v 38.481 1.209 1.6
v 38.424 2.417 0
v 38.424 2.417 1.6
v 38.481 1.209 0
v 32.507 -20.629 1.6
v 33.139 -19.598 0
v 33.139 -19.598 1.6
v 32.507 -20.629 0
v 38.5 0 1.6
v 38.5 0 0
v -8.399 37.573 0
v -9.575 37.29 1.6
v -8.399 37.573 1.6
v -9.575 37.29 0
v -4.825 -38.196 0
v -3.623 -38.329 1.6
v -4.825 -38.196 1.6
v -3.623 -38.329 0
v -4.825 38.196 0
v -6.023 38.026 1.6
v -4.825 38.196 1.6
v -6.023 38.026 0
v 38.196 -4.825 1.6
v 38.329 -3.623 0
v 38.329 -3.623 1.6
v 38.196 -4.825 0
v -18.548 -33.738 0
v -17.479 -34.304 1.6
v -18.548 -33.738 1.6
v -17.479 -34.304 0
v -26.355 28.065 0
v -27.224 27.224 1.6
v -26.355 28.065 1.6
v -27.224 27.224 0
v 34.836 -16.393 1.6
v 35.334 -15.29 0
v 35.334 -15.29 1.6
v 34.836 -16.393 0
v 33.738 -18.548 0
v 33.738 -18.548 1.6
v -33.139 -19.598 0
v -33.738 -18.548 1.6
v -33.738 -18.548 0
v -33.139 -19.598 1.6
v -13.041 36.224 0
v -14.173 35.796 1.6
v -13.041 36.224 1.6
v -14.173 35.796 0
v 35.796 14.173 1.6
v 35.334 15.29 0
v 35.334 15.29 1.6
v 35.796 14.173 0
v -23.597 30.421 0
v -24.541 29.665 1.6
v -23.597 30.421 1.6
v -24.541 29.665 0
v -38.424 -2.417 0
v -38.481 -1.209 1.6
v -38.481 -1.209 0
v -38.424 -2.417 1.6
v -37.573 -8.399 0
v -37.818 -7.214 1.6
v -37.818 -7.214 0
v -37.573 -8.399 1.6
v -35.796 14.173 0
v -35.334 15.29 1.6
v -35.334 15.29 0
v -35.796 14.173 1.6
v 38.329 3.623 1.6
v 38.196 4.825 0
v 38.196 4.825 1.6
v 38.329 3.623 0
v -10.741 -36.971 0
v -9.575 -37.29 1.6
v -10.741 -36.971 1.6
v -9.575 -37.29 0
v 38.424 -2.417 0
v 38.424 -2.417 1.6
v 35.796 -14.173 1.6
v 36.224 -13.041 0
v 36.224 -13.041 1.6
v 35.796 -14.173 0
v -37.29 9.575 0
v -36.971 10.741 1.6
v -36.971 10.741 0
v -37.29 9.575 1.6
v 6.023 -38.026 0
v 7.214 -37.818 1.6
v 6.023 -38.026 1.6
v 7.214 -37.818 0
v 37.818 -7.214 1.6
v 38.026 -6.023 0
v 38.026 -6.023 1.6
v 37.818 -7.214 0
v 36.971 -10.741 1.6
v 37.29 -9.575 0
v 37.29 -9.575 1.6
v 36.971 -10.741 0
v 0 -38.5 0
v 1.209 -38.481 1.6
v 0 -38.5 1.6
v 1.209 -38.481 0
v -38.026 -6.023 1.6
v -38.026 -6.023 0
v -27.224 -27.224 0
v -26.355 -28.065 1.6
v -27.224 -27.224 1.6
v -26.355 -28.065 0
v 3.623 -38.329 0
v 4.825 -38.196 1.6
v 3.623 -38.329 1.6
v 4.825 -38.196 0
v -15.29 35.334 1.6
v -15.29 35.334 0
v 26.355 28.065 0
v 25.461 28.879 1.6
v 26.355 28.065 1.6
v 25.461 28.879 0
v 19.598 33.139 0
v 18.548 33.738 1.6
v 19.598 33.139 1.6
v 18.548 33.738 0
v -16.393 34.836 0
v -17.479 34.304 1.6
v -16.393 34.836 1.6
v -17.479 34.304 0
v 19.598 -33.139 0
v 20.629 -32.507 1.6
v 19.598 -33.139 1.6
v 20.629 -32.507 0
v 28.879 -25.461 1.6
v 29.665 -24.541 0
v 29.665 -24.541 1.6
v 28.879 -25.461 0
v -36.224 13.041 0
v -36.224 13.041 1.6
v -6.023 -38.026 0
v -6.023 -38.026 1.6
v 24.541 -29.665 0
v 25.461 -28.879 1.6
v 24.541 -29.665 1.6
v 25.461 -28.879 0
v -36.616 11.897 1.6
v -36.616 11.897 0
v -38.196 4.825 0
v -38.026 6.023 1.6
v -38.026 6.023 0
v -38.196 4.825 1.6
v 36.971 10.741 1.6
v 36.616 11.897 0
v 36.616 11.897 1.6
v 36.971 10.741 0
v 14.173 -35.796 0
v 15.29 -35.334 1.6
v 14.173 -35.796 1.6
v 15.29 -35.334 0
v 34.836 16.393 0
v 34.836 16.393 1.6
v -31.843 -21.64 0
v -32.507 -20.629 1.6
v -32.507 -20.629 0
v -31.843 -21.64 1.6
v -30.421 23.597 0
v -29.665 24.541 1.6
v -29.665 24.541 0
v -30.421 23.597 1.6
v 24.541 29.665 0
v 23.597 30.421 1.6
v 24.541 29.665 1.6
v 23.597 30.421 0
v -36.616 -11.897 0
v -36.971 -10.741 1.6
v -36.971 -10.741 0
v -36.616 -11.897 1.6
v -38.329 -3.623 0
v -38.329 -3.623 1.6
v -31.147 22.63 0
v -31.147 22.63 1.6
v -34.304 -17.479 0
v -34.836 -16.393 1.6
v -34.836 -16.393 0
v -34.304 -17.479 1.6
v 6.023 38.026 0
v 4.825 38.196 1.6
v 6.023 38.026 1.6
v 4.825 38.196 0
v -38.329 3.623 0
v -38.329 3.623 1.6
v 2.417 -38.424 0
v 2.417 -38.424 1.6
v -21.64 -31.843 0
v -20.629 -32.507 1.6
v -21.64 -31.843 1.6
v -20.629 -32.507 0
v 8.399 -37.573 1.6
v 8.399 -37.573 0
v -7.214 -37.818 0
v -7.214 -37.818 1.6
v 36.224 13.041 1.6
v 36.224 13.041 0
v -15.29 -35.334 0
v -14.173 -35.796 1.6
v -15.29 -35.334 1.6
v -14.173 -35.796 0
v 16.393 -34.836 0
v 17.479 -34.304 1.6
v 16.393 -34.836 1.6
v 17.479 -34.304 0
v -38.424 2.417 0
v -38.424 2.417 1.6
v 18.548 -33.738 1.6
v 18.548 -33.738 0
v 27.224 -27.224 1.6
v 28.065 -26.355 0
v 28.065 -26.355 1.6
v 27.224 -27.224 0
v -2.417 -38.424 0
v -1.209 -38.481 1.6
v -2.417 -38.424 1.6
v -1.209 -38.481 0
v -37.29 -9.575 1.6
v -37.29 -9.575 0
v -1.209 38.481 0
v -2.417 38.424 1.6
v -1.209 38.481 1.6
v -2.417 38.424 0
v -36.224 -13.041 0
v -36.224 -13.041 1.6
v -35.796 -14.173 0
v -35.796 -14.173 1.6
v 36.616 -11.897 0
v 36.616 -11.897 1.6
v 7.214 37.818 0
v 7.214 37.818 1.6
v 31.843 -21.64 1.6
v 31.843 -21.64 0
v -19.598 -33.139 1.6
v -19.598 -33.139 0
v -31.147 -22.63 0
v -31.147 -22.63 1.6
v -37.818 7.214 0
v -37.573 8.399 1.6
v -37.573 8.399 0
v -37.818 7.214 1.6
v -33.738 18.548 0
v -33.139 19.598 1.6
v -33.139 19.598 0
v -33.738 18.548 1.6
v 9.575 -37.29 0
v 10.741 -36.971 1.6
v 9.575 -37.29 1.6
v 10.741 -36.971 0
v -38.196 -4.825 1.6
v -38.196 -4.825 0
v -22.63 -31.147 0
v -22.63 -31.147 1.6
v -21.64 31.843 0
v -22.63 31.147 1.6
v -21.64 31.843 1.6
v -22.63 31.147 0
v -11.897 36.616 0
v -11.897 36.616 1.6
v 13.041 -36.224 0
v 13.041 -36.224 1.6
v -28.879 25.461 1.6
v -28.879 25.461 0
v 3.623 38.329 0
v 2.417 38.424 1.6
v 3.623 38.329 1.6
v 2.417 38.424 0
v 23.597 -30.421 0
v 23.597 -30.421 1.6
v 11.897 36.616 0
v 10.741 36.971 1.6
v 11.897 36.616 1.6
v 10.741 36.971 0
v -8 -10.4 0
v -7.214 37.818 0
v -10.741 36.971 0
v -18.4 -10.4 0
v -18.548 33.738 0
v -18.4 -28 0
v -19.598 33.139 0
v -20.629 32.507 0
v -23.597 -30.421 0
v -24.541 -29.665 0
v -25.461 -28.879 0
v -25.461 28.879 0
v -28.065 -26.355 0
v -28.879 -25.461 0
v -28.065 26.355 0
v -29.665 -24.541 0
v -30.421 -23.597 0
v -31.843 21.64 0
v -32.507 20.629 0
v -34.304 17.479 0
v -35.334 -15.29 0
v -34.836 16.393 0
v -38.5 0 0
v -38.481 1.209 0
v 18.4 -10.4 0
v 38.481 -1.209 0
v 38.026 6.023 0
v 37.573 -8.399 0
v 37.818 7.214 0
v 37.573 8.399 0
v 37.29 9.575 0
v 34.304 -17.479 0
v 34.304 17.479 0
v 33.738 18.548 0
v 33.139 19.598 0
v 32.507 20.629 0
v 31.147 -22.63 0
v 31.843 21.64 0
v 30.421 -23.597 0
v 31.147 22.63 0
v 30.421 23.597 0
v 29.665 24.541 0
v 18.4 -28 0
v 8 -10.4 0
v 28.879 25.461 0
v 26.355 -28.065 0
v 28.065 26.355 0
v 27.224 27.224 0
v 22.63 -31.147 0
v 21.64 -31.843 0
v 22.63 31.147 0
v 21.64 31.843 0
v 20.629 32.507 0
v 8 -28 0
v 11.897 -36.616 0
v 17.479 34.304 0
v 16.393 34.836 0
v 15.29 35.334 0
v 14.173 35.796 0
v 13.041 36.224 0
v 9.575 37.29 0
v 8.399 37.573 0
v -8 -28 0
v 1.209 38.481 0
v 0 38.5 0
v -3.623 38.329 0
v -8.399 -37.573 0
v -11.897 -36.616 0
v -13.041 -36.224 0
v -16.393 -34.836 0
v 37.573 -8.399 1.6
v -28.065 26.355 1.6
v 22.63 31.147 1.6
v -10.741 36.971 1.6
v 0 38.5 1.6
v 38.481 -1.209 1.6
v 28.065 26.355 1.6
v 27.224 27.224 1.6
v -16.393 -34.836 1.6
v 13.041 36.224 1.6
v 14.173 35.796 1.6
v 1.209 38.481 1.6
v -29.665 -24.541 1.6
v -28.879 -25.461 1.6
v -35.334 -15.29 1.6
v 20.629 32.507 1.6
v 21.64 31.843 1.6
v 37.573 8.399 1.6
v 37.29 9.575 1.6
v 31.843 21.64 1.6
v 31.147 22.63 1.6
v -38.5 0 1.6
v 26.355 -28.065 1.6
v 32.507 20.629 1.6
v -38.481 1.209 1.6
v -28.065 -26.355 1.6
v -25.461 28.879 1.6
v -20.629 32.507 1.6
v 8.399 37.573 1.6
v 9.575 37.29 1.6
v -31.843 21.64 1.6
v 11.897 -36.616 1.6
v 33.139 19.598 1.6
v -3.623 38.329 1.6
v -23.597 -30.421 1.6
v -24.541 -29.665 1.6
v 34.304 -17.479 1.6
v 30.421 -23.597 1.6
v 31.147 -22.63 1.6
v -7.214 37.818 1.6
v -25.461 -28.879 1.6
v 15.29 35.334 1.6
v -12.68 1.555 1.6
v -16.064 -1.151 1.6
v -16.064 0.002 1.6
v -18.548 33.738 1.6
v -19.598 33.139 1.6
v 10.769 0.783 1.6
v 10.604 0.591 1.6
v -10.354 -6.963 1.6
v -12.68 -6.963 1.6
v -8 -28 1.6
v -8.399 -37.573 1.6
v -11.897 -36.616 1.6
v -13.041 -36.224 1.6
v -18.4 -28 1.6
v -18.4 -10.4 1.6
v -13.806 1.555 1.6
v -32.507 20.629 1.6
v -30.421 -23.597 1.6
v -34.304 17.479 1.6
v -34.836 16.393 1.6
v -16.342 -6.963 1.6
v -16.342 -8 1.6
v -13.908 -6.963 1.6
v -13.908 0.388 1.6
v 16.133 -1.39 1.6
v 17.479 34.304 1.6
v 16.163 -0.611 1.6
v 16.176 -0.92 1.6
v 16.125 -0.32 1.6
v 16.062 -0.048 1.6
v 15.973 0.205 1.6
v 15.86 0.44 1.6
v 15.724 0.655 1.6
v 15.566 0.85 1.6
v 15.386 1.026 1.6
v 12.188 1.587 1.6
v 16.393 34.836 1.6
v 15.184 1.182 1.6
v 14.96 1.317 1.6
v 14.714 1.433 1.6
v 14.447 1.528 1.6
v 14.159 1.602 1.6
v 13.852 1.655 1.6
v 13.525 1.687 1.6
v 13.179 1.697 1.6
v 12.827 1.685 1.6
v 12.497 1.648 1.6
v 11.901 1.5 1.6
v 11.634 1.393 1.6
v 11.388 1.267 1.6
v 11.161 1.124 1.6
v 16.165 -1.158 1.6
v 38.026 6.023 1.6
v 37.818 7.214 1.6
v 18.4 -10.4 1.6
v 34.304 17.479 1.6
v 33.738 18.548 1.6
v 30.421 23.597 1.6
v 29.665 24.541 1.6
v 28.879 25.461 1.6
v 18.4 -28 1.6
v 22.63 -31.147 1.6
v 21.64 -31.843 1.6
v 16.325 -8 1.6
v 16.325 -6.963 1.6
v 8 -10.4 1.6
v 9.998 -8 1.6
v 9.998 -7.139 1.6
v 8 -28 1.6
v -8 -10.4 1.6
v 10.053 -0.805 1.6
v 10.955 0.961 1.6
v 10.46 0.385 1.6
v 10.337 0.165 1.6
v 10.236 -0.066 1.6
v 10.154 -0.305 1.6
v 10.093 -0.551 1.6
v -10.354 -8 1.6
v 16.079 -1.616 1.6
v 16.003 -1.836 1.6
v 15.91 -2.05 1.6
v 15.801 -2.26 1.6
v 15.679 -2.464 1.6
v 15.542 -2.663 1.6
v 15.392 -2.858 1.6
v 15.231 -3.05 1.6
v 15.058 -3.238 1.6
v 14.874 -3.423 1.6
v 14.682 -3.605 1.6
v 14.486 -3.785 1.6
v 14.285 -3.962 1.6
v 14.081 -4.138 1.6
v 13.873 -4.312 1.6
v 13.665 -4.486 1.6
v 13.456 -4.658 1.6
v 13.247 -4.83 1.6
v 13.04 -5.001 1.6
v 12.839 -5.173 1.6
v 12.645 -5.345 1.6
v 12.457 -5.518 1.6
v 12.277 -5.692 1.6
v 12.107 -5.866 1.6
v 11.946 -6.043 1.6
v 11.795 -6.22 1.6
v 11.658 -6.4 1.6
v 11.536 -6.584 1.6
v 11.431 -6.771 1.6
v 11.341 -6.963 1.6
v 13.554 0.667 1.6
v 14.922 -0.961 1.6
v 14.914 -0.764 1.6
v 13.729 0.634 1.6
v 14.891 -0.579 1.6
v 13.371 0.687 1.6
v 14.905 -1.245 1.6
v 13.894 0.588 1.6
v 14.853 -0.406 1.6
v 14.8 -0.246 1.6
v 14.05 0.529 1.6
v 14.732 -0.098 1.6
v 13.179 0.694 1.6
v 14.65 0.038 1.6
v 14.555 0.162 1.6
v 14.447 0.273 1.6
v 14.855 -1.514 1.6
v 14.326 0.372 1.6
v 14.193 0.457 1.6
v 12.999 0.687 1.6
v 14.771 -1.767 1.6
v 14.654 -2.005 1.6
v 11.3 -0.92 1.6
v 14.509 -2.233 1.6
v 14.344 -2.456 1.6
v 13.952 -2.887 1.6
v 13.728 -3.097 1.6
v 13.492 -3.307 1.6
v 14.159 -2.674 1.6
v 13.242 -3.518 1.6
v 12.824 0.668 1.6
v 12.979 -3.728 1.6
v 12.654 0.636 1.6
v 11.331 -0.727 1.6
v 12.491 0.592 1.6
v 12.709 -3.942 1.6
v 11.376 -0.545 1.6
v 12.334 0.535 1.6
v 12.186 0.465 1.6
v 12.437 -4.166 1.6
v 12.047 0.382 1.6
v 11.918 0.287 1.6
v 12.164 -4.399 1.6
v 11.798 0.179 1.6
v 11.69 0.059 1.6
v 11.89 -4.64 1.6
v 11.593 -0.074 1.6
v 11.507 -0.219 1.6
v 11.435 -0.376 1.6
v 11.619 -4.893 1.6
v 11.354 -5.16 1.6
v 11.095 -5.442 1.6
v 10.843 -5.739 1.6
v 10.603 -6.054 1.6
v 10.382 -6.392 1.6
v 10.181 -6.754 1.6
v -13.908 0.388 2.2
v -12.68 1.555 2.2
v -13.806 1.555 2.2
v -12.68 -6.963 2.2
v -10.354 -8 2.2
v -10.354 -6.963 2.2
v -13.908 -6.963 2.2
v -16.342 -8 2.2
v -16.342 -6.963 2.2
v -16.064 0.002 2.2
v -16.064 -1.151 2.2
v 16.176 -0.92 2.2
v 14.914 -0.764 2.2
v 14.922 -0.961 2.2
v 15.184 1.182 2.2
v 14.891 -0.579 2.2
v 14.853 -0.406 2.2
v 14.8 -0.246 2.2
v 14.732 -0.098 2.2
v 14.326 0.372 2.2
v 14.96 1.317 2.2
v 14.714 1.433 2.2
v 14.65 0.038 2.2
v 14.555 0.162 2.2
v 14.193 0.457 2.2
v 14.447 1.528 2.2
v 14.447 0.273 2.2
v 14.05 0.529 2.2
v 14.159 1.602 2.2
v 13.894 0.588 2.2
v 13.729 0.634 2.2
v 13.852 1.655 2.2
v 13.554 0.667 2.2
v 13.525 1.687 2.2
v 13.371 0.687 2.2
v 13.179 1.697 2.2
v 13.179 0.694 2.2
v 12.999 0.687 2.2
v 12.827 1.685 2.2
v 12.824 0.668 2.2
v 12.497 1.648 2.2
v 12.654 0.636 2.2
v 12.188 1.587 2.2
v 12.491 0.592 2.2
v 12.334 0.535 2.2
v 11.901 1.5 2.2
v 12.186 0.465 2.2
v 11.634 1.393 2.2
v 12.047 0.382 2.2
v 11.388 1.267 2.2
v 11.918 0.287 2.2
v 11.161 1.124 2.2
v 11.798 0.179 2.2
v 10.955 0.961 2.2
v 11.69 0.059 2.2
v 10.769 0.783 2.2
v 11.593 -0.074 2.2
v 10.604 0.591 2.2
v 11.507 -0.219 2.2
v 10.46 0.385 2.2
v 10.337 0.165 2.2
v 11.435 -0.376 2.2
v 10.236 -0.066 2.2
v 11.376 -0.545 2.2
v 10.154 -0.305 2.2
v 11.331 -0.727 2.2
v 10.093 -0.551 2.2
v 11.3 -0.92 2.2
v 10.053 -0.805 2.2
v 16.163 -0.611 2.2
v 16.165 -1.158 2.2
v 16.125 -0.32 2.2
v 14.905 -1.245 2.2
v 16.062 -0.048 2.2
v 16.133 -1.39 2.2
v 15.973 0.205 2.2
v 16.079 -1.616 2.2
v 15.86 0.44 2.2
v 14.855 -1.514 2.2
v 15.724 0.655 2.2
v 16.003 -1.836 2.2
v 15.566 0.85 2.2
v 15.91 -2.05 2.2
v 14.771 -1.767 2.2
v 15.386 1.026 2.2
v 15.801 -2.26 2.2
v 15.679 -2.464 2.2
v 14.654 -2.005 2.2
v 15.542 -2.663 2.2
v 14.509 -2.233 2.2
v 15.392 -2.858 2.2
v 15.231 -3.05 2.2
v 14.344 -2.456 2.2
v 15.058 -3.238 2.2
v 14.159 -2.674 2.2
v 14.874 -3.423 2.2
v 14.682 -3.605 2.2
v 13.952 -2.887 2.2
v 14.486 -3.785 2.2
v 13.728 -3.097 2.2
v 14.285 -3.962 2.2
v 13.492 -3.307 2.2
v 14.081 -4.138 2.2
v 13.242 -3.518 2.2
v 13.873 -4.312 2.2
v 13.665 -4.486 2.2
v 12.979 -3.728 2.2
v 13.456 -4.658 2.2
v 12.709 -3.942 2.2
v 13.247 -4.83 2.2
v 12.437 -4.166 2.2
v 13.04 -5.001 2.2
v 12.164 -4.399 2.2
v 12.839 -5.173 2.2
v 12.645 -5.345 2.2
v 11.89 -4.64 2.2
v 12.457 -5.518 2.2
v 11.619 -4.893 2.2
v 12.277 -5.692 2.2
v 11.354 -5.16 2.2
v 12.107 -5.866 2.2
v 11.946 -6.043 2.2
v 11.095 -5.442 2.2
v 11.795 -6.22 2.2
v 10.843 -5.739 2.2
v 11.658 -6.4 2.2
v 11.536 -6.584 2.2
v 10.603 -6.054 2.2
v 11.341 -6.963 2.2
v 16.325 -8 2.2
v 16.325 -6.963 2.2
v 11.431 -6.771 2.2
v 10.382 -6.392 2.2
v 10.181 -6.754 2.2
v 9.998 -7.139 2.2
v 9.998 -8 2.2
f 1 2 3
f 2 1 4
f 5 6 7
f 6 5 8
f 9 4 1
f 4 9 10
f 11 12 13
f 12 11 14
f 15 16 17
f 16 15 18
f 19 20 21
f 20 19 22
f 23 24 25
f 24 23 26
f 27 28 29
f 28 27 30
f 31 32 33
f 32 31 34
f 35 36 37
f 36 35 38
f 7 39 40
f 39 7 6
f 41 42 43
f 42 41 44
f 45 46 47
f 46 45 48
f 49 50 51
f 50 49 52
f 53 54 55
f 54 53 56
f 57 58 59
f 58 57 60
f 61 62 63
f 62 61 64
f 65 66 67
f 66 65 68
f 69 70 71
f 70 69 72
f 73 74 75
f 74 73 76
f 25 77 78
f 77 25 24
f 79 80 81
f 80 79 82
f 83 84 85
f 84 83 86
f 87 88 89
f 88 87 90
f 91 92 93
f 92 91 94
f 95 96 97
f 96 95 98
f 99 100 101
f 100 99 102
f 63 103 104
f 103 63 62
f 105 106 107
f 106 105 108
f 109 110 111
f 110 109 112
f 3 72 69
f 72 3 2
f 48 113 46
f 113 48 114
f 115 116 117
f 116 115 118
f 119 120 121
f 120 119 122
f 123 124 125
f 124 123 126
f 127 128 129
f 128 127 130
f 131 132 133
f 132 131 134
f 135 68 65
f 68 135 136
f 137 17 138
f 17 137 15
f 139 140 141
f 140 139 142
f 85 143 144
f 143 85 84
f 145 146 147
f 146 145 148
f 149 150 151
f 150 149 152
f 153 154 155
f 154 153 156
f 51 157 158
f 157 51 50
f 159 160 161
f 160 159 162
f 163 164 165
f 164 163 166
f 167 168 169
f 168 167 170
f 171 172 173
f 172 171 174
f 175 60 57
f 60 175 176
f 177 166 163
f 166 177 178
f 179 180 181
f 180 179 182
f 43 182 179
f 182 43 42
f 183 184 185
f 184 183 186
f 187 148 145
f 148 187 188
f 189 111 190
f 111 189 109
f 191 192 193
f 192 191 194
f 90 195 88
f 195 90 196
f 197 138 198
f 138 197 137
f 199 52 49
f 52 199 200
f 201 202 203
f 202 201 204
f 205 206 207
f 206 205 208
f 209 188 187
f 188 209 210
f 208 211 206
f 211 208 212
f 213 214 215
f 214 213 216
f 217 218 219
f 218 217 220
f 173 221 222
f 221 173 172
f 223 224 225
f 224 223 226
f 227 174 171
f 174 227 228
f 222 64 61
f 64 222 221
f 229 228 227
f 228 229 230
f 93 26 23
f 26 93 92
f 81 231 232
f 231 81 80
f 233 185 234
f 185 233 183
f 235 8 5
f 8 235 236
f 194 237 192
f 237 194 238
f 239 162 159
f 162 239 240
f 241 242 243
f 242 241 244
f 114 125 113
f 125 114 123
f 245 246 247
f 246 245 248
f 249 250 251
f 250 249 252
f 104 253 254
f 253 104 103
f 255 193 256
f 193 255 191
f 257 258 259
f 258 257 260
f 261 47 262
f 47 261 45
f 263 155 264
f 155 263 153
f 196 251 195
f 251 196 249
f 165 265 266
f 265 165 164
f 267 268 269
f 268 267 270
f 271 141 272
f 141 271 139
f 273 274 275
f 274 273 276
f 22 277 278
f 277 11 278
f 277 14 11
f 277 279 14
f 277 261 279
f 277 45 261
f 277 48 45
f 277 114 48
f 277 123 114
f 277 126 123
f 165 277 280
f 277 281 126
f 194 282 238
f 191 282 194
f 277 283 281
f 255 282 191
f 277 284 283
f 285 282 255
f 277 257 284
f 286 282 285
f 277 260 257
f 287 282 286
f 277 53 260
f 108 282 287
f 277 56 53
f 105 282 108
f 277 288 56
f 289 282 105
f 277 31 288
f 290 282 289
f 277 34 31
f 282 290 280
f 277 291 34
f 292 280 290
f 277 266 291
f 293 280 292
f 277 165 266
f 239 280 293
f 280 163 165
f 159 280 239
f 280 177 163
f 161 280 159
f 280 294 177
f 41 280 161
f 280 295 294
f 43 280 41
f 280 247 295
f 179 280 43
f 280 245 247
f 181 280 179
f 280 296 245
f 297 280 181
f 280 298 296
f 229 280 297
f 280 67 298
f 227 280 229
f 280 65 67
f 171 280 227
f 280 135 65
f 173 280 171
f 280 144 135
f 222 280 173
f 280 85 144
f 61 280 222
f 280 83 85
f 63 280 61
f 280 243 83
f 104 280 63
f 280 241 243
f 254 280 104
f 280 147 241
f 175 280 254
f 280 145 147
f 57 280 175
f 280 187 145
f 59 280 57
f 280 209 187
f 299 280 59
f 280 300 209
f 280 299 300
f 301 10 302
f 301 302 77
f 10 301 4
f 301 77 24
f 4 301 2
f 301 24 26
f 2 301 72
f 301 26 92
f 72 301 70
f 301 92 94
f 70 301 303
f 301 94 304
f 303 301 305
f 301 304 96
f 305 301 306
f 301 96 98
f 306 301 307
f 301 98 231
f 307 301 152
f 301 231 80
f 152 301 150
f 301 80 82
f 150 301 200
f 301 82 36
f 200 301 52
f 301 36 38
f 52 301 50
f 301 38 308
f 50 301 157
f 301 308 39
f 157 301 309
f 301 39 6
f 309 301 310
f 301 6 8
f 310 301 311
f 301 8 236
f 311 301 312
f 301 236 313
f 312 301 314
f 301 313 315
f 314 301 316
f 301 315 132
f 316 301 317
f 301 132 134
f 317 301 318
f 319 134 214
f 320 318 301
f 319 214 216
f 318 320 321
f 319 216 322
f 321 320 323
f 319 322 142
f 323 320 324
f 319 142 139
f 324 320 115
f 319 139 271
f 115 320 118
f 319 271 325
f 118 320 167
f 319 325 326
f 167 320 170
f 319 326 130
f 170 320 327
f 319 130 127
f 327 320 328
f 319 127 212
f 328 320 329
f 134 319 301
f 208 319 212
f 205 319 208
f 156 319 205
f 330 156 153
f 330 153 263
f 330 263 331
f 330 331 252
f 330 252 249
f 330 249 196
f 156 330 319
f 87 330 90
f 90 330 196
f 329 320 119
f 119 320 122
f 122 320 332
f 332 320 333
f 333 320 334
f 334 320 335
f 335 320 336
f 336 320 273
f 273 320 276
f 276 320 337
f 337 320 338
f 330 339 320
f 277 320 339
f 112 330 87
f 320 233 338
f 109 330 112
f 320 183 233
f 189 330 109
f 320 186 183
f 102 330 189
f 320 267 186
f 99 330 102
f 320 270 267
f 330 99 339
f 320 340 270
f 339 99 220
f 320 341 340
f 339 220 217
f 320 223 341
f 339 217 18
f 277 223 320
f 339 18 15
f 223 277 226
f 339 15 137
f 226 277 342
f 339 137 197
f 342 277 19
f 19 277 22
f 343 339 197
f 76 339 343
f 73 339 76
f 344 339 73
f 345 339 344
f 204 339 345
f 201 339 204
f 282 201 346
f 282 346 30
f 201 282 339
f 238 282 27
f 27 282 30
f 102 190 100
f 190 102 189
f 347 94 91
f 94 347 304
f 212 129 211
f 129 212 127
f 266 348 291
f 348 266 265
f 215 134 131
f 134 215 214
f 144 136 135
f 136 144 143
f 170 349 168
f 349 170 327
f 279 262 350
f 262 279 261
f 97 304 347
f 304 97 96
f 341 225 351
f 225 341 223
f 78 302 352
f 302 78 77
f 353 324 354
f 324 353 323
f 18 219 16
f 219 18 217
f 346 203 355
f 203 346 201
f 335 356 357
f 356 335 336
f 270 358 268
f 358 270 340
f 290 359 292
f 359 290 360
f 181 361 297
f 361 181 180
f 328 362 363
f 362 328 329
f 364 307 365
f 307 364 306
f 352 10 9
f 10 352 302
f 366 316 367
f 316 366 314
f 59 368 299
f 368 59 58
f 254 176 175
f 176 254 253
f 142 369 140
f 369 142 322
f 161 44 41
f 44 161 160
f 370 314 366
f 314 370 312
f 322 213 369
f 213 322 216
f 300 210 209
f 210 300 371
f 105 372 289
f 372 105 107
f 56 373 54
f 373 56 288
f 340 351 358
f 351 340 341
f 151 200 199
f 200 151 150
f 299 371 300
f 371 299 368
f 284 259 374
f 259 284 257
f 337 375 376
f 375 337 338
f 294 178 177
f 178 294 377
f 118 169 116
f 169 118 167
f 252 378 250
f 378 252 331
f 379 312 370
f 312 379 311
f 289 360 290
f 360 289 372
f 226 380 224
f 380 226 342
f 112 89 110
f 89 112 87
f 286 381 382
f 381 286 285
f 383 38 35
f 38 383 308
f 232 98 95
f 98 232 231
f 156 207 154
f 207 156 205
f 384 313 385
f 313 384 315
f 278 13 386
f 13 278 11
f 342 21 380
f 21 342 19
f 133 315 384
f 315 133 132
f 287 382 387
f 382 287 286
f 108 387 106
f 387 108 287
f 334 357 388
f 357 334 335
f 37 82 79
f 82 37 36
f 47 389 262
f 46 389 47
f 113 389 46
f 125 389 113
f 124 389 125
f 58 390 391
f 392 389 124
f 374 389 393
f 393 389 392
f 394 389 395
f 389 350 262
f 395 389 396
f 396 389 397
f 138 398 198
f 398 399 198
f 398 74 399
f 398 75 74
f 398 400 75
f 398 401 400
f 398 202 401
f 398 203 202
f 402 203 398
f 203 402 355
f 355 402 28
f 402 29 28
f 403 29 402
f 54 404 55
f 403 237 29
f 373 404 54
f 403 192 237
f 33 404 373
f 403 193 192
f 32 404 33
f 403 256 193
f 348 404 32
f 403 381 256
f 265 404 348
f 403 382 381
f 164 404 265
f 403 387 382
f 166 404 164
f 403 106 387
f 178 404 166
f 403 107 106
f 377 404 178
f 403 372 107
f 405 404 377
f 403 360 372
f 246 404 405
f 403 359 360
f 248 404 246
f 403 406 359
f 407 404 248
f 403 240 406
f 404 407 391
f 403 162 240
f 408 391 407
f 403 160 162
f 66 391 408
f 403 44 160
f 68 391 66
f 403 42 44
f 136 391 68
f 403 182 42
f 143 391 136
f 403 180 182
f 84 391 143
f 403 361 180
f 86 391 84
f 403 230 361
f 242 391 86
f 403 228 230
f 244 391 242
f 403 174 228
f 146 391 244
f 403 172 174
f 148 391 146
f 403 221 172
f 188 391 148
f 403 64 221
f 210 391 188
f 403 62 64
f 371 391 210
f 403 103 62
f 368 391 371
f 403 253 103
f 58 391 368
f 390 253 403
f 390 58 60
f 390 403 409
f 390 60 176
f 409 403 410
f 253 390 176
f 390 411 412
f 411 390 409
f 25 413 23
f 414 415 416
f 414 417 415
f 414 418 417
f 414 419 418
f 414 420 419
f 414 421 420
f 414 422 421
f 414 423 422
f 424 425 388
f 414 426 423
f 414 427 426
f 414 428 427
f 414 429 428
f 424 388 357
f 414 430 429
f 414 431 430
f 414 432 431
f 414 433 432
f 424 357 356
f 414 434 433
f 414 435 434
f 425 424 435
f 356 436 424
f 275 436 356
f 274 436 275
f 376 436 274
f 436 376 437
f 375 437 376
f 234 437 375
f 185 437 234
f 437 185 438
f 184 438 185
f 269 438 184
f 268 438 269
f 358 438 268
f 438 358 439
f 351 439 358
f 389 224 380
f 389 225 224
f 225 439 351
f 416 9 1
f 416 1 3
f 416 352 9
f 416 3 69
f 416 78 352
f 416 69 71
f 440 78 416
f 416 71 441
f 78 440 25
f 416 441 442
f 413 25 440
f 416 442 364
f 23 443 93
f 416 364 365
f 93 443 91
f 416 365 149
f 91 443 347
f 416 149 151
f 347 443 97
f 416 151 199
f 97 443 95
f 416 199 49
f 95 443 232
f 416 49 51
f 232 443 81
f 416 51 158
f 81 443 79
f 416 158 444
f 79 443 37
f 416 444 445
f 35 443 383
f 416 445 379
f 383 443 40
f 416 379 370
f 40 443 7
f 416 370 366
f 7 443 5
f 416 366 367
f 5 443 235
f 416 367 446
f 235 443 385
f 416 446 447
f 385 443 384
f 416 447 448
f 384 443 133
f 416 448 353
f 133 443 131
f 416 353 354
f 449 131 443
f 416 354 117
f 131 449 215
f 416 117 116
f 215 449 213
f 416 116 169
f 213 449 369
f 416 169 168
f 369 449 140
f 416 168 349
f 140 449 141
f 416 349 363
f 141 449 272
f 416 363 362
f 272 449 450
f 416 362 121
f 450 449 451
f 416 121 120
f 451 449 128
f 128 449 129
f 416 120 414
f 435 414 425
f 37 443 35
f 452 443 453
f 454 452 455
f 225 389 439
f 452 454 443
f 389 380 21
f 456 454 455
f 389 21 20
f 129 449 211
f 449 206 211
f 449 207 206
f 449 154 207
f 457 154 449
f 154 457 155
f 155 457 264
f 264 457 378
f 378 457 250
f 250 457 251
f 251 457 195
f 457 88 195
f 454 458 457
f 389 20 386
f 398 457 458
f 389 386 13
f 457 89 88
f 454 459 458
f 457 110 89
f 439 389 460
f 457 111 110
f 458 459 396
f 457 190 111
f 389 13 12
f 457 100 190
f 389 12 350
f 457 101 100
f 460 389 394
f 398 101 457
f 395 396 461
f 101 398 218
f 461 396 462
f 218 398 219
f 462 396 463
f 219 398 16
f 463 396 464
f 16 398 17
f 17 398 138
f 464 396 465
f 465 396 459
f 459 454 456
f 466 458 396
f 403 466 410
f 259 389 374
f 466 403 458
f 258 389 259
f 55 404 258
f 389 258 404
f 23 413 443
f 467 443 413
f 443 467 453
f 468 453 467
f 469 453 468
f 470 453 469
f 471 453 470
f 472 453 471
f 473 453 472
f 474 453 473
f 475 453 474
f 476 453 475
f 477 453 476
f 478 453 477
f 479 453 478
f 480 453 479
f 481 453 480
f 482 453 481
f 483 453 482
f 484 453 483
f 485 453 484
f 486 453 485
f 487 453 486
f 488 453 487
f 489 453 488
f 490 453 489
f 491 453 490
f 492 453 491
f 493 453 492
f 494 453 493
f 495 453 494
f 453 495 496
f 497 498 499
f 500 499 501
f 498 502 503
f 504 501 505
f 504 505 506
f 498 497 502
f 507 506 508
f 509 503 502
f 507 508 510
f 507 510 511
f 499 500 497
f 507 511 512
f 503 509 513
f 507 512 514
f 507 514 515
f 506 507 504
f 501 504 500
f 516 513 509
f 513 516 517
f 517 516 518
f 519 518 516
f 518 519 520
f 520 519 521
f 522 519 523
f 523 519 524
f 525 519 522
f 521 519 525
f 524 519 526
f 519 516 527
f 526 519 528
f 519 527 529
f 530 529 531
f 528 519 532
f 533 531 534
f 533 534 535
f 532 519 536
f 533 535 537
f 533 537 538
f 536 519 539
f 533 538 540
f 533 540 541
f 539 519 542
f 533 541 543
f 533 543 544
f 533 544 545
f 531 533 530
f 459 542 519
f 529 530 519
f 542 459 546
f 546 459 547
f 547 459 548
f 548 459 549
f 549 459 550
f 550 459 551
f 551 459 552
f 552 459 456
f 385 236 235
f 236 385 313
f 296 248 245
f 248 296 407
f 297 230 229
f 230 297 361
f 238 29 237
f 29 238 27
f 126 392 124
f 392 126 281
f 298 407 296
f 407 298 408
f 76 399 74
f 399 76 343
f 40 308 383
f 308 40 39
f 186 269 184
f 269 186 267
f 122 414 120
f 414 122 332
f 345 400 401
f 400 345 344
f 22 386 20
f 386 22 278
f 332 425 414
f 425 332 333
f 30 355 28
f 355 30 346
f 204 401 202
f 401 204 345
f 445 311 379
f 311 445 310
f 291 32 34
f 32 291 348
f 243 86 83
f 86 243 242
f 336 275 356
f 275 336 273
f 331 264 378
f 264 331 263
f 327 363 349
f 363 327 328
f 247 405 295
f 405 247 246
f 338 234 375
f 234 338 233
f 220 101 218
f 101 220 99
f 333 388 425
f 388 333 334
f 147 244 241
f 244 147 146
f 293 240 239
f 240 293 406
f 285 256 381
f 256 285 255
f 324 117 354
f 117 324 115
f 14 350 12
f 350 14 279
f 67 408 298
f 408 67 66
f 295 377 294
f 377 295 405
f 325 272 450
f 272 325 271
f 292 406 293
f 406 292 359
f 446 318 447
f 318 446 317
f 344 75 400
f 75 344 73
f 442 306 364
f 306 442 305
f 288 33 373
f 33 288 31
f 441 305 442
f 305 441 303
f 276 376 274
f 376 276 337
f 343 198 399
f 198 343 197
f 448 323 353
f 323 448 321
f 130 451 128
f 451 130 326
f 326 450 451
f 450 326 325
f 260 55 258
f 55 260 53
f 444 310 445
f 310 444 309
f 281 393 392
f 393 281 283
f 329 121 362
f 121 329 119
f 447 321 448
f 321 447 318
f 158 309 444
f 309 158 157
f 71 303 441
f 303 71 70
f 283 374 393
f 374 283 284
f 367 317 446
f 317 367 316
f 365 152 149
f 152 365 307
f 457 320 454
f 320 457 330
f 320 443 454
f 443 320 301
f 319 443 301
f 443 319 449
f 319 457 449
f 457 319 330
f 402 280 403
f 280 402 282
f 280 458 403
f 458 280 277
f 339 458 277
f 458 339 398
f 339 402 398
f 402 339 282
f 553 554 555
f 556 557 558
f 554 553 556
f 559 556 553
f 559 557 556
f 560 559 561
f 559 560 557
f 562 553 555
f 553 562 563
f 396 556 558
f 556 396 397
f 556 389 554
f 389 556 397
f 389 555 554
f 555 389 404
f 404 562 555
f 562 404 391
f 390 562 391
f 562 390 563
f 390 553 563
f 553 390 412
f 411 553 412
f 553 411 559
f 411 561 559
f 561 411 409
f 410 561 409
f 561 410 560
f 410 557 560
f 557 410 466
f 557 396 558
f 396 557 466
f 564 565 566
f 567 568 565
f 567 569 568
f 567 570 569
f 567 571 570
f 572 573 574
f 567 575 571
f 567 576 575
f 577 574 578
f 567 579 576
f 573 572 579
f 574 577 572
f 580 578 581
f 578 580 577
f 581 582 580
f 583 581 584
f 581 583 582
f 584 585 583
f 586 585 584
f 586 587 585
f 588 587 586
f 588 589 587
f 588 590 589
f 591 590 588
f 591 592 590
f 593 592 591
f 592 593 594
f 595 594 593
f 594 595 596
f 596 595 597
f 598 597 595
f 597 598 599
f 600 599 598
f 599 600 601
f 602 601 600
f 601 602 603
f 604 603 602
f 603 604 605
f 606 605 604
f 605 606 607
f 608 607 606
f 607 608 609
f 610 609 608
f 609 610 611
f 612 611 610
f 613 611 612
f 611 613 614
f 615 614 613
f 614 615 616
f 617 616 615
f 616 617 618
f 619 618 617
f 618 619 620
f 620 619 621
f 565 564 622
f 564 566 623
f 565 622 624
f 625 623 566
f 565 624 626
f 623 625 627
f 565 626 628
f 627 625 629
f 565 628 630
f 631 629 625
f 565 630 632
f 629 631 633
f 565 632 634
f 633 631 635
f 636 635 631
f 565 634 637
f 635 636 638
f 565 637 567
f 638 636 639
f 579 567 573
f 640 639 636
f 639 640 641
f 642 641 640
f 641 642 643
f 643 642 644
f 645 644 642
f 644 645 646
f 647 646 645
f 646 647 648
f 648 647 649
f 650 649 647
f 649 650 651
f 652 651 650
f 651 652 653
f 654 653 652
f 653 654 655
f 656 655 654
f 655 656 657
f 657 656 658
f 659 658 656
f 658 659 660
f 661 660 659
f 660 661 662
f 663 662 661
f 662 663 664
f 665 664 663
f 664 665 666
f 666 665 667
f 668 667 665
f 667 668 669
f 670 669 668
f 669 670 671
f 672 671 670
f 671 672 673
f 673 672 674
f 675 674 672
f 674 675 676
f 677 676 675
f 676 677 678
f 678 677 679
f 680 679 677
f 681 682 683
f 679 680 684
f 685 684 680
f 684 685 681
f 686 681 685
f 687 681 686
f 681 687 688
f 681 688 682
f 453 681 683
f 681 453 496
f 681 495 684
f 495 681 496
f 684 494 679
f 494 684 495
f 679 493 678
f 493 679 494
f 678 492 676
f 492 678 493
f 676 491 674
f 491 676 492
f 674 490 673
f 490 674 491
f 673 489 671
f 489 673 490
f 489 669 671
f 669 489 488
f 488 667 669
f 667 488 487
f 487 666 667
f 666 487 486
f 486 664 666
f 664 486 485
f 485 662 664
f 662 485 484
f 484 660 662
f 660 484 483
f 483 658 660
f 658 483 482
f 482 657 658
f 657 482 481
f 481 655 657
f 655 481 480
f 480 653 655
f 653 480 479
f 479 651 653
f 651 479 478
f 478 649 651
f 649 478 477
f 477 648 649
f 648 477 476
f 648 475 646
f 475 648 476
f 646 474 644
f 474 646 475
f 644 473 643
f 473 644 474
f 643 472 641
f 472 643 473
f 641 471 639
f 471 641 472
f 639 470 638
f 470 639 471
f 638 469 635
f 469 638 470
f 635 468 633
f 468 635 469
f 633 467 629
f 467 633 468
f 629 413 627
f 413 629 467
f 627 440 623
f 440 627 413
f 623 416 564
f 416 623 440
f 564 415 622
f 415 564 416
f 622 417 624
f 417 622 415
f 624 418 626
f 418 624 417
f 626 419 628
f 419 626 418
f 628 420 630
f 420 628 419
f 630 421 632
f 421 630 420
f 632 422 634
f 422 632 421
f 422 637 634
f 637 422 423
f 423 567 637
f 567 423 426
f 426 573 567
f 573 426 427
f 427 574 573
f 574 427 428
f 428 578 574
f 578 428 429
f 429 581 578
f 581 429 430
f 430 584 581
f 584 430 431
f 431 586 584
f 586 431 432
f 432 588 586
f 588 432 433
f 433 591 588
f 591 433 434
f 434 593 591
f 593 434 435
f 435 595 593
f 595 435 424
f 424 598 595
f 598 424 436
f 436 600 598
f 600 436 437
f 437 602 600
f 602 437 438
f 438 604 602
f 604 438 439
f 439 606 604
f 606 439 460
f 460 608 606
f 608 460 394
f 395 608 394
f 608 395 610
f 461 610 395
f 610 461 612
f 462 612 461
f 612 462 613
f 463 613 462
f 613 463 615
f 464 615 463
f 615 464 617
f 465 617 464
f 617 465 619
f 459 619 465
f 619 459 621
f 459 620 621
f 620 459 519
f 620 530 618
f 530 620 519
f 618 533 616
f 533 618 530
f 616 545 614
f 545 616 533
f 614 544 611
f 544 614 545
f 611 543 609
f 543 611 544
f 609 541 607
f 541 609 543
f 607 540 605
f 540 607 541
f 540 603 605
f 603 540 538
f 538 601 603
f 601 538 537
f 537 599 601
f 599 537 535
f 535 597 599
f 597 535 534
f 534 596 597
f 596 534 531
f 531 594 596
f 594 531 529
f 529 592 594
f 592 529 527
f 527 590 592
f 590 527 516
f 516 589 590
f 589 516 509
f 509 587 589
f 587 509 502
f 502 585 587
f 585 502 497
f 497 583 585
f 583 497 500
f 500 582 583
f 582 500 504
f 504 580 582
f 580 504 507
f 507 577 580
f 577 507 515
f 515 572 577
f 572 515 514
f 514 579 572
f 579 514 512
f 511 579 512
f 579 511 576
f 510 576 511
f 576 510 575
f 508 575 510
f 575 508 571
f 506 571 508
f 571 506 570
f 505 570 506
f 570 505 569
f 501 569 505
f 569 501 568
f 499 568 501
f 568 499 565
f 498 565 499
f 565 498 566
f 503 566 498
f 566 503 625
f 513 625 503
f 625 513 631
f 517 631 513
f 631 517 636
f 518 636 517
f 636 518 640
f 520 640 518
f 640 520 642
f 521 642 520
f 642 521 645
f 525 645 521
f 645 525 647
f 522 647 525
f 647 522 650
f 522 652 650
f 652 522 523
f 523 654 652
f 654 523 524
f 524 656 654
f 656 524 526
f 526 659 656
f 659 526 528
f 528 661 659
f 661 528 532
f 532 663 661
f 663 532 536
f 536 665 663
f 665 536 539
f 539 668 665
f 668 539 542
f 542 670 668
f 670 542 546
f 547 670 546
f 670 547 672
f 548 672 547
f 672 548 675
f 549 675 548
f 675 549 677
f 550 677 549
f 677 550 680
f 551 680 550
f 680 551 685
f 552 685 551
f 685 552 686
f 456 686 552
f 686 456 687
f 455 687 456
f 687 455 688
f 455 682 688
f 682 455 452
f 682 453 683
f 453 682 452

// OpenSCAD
difference(){
linear_extrude(height=1.6)
circle(38.5, $fn = 200);

linear_extrude(height=1.6)
    translate([8,-28])
square([10.4,17.6]);


linear_extrude(height=1.6)
    translate([-18.4,-28])
square([10.4,17.6]);

}
linear_extrude(height=2.2)
    translate([-17.4,-8])
text("1");

linear_extrude(height=2.2)
    translate([9.3,-8])
text("2");
